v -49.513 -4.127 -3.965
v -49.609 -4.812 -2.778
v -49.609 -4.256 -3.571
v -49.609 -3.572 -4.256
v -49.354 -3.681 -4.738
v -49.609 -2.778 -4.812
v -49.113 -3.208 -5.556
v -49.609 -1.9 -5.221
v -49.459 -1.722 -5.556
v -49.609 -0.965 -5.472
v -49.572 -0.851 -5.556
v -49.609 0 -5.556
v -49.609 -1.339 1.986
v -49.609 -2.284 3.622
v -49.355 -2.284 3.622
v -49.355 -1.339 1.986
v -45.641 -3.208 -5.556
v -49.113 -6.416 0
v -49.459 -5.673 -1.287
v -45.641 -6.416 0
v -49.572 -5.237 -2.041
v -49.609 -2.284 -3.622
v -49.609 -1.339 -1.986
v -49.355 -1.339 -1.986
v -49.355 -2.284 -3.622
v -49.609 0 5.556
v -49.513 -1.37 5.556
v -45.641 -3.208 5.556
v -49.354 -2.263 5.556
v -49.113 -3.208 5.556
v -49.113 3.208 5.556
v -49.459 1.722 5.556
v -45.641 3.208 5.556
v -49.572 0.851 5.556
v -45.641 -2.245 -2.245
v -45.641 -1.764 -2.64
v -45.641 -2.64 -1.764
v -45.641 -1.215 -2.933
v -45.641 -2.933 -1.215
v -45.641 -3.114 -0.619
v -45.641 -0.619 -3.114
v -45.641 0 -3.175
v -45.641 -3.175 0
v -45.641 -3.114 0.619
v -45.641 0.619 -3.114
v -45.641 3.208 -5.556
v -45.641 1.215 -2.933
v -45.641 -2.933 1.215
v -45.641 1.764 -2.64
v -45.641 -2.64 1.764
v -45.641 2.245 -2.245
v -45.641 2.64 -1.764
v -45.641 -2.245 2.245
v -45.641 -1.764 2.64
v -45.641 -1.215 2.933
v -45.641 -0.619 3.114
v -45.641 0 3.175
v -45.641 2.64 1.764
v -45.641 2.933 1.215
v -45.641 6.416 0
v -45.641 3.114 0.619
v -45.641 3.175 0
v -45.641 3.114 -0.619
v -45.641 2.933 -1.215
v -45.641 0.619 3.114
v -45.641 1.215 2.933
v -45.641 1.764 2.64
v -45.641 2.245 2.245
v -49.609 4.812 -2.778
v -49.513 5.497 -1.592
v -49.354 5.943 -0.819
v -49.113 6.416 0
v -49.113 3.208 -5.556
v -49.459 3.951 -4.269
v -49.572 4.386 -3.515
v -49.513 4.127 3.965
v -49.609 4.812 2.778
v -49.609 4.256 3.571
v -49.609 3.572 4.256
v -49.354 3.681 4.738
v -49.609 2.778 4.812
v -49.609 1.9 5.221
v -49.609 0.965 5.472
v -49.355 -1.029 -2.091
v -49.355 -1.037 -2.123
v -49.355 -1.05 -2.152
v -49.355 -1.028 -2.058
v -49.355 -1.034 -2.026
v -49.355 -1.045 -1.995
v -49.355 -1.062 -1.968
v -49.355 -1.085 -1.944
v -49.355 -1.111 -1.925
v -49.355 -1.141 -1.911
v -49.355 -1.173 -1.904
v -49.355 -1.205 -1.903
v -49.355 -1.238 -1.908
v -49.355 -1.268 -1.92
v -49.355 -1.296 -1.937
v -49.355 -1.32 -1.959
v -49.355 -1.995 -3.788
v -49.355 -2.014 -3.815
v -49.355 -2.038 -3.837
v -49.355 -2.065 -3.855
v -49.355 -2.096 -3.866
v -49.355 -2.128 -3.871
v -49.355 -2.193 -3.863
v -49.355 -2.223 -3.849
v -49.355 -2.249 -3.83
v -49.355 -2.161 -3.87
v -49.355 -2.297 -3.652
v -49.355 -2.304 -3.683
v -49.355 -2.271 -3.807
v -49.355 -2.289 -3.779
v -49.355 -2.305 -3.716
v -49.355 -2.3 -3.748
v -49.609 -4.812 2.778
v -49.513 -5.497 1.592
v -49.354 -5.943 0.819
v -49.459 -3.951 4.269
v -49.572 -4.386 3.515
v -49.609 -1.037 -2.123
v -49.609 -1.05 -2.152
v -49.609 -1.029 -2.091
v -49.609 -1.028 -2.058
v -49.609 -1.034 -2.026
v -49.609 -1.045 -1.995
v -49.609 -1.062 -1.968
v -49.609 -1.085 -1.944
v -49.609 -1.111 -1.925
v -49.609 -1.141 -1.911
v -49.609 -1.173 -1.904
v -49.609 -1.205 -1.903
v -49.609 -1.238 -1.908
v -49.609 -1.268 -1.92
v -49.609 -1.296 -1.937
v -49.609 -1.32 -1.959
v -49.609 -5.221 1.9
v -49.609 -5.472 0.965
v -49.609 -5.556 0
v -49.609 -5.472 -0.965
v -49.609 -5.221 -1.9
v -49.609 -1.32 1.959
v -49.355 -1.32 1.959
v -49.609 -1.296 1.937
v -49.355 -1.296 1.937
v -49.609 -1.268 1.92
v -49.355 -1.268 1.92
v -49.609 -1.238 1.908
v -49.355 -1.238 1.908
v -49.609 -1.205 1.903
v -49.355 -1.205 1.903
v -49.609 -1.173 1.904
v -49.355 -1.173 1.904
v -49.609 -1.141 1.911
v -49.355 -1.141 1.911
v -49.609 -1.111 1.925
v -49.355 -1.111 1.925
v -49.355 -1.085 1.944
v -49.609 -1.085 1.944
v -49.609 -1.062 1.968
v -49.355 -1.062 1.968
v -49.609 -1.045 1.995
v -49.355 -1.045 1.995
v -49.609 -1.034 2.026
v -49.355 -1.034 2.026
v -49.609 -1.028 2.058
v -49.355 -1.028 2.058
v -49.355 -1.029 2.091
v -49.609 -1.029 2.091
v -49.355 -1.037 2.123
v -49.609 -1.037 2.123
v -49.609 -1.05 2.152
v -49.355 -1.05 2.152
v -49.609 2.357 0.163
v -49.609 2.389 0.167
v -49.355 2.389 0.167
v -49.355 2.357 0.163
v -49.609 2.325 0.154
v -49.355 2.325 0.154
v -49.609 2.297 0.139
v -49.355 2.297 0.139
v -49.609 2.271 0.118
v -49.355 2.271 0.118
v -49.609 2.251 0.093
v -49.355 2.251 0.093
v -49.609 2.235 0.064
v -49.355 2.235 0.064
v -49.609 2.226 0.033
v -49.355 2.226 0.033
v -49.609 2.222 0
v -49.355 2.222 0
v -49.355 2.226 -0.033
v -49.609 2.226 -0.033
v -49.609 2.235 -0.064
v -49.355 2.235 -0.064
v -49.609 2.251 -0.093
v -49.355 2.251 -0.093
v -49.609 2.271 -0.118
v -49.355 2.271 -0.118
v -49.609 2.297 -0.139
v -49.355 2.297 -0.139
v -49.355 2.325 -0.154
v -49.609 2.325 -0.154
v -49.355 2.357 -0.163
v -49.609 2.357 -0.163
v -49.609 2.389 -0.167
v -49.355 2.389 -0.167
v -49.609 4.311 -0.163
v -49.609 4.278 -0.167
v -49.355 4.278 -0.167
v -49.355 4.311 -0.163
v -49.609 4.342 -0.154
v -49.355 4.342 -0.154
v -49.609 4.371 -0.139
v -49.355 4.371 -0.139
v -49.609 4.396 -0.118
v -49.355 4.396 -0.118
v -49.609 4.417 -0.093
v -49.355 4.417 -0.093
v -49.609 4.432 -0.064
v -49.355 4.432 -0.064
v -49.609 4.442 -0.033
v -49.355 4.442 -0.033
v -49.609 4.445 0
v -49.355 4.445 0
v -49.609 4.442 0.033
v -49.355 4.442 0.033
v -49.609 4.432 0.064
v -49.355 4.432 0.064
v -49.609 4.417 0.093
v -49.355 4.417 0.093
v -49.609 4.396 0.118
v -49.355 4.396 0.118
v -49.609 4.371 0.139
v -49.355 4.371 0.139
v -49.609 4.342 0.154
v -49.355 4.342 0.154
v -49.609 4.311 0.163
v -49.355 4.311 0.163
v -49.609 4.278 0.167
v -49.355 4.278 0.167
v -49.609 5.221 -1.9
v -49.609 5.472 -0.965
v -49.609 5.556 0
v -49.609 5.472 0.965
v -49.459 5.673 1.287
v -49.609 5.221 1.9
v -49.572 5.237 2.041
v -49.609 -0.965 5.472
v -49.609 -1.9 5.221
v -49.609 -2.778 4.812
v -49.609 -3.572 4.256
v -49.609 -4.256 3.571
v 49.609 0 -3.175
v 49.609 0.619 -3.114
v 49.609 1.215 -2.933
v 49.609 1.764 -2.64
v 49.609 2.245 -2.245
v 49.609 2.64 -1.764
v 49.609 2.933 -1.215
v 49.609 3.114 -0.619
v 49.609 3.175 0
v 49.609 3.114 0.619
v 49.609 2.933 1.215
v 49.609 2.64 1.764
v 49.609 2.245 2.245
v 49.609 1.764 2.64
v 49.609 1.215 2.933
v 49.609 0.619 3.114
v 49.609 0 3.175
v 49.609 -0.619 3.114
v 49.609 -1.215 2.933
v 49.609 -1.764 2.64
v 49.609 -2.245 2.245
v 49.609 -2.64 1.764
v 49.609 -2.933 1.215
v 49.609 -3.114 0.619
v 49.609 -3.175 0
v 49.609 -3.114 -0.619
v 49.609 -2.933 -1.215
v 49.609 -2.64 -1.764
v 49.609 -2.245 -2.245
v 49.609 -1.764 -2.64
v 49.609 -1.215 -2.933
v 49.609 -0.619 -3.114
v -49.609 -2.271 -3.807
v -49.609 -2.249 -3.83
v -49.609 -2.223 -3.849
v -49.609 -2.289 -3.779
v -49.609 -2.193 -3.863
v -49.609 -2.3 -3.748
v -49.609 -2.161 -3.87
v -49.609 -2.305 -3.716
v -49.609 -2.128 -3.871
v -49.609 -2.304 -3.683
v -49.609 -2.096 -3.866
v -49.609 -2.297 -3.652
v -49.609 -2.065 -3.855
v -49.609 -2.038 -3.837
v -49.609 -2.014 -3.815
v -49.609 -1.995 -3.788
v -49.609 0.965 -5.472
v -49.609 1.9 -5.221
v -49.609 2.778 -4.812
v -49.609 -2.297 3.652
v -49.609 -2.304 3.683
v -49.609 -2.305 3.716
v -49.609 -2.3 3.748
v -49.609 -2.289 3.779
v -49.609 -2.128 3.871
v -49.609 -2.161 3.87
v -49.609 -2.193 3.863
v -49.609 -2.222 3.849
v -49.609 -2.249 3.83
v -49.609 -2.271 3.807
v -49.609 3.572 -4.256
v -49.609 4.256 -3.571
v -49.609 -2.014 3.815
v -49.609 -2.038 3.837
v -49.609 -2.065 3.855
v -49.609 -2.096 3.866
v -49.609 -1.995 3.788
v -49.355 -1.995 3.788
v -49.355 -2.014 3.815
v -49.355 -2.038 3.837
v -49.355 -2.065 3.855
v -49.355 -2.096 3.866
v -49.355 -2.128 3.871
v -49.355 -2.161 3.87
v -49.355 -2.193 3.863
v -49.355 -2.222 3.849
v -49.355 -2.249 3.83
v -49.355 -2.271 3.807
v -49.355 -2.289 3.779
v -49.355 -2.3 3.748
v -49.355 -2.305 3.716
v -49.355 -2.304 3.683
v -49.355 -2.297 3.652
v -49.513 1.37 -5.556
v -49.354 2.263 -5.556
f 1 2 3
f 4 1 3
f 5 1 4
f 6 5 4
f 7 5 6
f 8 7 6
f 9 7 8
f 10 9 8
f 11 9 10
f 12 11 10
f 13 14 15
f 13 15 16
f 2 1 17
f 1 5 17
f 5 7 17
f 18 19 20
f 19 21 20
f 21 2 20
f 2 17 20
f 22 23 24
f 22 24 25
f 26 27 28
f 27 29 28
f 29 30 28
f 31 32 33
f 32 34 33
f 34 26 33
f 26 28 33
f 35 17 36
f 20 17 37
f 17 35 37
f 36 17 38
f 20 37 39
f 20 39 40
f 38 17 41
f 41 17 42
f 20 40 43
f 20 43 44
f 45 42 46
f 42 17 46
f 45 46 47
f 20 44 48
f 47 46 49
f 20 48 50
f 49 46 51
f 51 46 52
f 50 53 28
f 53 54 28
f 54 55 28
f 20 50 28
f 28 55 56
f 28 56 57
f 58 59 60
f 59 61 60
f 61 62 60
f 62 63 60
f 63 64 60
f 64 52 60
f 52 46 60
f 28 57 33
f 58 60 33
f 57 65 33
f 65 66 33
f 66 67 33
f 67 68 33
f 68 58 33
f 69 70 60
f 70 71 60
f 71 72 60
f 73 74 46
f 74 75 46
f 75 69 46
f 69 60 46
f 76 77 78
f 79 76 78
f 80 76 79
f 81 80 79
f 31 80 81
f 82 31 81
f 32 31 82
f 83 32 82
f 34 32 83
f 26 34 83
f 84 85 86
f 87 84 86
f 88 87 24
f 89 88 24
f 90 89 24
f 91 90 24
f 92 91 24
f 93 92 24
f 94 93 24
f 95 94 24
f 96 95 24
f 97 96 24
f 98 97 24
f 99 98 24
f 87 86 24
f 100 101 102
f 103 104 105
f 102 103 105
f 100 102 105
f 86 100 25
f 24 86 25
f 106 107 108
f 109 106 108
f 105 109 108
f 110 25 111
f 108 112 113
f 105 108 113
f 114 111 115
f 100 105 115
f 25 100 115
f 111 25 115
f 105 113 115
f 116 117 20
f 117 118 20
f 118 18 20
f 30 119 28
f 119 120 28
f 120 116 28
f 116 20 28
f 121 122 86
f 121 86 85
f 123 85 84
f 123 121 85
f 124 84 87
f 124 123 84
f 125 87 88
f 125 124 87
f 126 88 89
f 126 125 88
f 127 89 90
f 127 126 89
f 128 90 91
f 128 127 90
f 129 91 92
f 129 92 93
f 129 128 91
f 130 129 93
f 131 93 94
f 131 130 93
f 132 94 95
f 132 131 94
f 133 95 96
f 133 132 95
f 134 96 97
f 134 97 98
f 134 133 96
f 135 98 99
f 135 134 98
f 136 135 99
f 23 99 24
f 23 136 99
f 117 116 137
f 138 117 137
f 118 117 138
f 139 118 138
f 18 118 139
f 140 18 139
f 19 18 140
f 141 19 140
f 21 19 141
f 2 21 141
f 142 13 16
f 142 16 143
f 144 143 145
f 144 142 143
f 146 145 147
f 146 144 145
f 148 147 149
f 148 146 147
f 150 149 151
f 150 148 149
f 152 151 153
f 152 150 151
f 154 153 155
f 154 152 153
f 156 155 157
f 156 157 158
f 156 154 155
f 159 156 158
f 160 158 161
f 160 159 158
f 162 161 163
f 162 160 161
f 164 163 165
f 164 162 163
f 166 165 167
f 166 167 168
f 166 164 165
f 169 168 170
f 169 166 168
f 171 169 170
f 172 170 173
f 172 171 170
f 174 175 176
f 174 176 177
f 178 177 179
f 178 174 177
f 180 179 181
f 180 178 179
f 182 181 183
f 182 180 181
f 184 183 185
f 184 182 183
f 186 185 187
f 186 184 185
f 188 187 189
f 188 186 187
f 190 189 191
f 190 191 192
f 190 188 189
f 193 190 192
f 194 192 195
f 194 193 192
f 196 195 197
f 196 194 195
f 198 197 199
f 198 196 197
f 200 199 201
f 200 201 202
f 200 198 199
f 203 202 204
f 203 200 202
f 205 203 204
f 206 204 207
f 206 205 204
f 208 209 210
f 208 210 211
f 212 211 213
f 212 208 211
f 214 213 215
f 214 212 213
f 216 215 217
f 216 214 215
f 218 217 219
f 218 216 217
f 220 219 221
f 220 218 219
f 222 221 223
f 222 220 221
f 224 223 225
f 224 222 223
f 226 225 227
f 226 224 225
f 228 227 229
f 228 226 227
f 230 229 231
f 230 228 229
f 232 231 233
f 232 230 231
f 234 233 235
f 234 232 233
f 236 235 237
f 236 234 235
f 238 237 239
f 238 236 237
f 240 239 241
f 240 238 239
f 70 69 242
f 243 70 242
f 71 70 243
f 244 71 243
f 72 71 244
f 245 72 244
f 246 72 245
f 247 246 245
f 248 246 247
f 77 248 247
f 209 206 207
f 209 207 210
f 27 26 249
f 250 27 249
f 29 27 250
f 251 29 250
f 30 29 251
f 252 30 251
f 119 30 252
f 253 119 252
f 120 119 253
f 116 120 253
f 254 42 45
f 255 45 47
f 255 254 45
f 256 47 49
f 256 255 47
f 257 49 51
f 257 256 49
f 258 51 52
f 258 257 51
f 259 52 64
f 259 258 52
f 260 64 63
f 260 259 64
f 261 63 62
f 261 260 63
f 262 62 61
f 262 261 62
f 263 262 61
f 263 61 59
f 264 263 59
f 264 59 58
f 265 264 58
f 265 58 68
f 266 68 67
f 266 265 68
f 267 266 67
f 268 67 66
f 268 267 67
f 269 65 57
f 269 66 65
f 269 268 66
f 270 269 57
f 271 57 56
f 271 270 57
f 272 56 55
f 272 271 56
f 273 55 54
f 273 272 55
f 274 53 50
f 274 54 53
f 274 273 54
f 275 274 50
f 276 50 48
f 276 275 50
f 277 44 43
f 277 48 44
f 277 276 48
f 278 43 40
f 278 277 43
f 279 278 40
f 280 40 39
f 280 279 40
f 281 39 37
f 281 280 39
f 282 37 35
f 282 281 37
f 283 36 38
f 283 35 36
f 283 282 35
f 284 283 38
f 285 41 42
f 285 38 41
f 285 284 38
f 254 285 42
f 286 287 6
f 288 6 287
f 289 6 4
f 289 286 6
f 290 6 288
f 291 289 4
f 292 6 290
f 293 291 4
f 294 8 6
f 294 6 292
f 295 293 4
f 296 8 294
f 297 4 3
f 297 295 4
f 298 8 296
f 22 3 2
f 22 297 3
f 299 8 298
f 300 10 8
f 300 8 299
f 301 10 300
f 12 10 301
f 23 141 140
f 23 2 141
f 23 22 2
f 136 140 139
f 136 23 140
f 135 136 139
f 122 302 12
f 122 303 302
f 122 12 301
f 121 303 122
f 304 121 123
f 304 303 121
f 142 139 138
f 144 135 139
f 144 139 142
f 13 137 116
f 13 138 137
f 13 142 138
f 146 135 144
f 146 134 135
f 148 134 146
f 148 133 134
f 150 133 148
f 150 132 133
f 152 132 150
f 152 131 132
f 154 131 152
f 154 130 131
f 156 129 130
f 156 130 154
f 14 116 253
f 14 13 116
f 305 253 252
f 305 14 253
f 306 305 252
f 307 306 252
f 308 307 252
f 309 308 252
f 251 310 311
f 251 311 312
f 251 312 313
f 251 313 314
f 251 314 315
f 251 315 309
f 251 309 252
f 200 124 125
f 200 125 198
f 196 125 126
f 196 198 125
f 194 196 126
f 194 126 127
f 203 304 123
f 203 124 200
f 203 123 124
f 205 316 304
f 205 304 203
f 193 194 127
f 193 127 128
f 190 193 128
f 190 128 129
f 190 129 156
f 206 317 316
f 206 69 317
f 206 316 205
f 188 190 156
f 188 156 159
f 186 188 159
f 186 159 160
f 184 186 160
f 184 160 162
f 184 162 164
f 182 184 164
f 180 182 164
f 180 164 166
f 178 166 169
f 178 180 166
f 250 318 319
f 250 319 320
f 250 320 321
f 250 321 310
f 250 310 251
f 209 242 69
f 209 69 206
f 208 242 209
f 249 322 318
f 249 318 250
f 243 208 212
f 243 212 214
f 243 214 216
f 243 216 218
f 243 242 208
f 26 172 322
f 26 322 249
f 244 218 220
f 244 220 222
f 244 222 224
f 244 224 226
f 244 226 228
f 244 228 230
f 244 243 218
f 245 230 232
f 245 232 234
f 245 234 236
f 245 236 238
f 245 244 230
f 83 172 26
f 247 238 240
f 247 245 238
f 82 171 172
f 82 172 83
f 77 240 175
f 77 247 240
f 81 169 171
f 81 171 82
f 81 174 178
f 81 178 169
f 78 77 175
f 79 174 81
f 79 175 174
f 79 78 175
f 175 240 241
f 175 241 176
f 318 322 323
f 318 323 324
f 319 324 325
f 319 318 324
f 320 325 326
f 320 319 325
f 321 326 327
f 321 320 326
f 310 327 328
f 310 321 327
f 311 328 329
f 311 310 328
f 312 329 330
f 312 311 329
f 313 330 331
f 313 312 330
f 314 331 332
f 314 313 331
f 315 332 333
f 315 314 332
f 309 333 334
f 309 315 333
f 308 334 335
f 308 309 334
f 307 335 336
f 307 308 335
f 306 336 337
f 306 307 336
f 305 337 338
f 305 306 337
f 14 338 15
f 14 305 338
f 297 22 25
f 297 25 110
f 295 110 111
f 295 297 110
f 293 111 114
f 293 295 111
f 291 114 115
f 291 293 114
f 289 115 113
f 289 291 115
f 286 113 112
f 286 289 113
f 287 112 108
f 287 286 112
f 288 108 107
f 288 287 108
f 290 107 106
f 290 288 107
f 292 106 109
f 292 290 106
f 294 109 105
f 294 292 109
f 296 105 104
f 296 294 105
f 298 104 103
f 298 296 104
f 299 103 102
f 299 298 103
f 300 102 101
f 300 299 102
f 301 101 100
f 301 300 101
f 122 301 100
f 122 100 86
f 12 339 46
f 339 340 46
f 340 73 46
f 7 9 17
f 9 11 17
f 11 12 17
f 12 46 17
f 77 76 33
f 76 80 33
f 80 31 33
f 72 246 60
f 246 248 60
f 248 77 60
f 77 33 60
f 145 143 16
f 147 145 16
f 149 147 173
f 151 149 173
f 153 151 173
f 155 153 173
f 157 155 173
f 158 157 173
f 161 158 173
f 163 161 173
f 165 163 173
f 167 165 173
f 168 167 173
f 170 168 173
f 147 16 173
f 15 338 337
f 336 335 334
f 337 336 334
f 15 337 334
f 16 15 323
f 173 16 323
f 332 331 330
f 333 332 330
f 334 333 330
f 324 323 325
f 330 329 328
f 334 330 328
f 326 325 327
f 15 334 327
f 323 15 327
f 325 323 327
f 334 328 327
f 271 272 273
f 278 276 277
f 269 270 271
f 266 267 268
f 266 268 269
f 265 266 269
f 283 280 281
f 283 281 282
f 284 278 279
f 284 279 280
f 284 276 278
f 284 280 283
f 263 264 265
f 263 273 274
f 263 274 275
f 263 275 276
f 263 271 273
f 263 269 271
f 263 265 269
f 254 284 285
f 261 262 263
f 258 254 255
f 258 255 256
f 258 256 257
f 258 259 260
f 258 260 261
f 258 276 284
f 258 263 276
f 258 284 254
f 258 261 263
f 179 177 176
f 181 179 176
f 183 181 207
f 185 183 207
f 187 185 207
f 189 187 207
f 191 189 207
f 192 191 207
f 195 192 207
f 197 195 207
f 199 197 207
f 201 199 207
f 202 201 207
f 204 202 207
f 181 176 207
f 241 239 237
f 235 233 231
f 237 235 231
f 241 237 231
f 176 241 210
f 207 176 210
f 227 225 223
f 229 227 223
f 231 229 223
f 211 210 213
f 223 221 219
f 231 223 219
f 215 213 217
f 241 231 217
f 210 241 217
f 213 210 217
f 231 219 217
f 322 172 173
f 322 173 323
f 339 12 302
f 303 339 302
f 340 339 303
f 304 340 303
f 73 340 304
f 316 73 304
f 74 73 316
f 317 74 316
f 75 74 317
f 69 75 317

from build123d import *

# Parameters (mm, degrees)
SKETCH5_R           = 3.175
BOSS_EXTRUDE3_DEPTH = 95.25
BOSS_EXTRUDE4_DEPTH = 3.96875
SKETCH8_OUTSIDE_W   = 380.412
SKETCH8_OUTSIDE_H   = 382.132
SKETCH8_OUTSIDE_R   = 5.55625
CUT_EXTRUDE3_DEPTH  = 100.21875
CUT_EXTRUDE3_TAPER  = 60
CUT_EXTRUDE4_DEPTH  = 0.254
CIRPATTERN1_COUNT   = 3


with BuildPart() as part:
    # Sketch5 → Boss-Extrude3 (new body)
    with BuildSketch(Plane(origin=(49.609375, 0, 0), x_dir=(0, 0, -1), z_dir=(1, 0, 0))):
        Circle(SKETCH5_R)
    extrude(amount=-BOSS_EXTRUDE3_DEPTH)

    # Sketch11 → Revolve1 (revolve)
    with BuildSketch(Plane.XY):
        Polygon((-45.640625, 3.175), (-45.640625, 0), (33.734375, 0), (30.559375, 3.175), align=None)
    revolve(axis=Axis((-45.640625, 0, 0), (1, 0, 0)))

    # Sketch6 → Boss-Extrude4 (add)
    with BuildSketch(Plane.ZY.offset(45.640625)):
        Polygon((5.55625, 3.207902433), (0, 6.415804866), (-5.55625, 3.207902433), (-5.55625, -3.207902433), (0, -6.415804866), (5.55625, -3.207902433), align=None)
    extrude(amount=BOSS_EXTRUDE4_DEPTH)

    # Sketch8 outside → Cut-Extrude3 (cut, through all)
    with BuildSketch(Plane.ZY.offset(49.609375)):
        Rectangle(SKETCH8_OUTSIDE_W, SKETCH8_OUTSIDE_H)
        Circle(SKETCH8_OUTSIDE_R, mode=Mode.SUBTRACT)
    extrude(amount=-CUT_EXTRUDE3_DEPTH, taper=CUT_EXTRUDE3_TAPER, mode=Mode.SUBTRACT)

    # Sketch12 → Cut-Extrude4 (cut)
    with BuildSketch(Plane.ZY.offset(49.609375)):
        with BuildLine():
            Line((0.1666875, 4.2783125), (0.1666875, 2.3891875))
            ThreePointArc((0.1666875, 2.3891875), (0, 2.2225), (-0.1666875, 2.3891875))
            Line((-0.1666875, 2.3891875), (-0.1666875, 4.2783125))
            ThreePointArc((-0.1666875, 4.2783125), (0, 4.445), (0.1666875, 4.2783125))
        make_face()
    cut_extrude4 = extrude(amount=-CUT_EXTRUDE4_DEPTH, mode=Mode.SUBTRACT)

    # CirPattern1: Cut-Extrude4 ×3 about axis
    cirpattern1_axis = Axis((0, 0, 0), (1, 0, 0))
    for i in range(1, CIRPATTERN1_COUNT):
        add(cut_extrude4.rotate(cirpattern1_axis, i * 360 / CIRPATTERN1_COUNT), mode=Mode.SUBTRACT)


solid = part.part
